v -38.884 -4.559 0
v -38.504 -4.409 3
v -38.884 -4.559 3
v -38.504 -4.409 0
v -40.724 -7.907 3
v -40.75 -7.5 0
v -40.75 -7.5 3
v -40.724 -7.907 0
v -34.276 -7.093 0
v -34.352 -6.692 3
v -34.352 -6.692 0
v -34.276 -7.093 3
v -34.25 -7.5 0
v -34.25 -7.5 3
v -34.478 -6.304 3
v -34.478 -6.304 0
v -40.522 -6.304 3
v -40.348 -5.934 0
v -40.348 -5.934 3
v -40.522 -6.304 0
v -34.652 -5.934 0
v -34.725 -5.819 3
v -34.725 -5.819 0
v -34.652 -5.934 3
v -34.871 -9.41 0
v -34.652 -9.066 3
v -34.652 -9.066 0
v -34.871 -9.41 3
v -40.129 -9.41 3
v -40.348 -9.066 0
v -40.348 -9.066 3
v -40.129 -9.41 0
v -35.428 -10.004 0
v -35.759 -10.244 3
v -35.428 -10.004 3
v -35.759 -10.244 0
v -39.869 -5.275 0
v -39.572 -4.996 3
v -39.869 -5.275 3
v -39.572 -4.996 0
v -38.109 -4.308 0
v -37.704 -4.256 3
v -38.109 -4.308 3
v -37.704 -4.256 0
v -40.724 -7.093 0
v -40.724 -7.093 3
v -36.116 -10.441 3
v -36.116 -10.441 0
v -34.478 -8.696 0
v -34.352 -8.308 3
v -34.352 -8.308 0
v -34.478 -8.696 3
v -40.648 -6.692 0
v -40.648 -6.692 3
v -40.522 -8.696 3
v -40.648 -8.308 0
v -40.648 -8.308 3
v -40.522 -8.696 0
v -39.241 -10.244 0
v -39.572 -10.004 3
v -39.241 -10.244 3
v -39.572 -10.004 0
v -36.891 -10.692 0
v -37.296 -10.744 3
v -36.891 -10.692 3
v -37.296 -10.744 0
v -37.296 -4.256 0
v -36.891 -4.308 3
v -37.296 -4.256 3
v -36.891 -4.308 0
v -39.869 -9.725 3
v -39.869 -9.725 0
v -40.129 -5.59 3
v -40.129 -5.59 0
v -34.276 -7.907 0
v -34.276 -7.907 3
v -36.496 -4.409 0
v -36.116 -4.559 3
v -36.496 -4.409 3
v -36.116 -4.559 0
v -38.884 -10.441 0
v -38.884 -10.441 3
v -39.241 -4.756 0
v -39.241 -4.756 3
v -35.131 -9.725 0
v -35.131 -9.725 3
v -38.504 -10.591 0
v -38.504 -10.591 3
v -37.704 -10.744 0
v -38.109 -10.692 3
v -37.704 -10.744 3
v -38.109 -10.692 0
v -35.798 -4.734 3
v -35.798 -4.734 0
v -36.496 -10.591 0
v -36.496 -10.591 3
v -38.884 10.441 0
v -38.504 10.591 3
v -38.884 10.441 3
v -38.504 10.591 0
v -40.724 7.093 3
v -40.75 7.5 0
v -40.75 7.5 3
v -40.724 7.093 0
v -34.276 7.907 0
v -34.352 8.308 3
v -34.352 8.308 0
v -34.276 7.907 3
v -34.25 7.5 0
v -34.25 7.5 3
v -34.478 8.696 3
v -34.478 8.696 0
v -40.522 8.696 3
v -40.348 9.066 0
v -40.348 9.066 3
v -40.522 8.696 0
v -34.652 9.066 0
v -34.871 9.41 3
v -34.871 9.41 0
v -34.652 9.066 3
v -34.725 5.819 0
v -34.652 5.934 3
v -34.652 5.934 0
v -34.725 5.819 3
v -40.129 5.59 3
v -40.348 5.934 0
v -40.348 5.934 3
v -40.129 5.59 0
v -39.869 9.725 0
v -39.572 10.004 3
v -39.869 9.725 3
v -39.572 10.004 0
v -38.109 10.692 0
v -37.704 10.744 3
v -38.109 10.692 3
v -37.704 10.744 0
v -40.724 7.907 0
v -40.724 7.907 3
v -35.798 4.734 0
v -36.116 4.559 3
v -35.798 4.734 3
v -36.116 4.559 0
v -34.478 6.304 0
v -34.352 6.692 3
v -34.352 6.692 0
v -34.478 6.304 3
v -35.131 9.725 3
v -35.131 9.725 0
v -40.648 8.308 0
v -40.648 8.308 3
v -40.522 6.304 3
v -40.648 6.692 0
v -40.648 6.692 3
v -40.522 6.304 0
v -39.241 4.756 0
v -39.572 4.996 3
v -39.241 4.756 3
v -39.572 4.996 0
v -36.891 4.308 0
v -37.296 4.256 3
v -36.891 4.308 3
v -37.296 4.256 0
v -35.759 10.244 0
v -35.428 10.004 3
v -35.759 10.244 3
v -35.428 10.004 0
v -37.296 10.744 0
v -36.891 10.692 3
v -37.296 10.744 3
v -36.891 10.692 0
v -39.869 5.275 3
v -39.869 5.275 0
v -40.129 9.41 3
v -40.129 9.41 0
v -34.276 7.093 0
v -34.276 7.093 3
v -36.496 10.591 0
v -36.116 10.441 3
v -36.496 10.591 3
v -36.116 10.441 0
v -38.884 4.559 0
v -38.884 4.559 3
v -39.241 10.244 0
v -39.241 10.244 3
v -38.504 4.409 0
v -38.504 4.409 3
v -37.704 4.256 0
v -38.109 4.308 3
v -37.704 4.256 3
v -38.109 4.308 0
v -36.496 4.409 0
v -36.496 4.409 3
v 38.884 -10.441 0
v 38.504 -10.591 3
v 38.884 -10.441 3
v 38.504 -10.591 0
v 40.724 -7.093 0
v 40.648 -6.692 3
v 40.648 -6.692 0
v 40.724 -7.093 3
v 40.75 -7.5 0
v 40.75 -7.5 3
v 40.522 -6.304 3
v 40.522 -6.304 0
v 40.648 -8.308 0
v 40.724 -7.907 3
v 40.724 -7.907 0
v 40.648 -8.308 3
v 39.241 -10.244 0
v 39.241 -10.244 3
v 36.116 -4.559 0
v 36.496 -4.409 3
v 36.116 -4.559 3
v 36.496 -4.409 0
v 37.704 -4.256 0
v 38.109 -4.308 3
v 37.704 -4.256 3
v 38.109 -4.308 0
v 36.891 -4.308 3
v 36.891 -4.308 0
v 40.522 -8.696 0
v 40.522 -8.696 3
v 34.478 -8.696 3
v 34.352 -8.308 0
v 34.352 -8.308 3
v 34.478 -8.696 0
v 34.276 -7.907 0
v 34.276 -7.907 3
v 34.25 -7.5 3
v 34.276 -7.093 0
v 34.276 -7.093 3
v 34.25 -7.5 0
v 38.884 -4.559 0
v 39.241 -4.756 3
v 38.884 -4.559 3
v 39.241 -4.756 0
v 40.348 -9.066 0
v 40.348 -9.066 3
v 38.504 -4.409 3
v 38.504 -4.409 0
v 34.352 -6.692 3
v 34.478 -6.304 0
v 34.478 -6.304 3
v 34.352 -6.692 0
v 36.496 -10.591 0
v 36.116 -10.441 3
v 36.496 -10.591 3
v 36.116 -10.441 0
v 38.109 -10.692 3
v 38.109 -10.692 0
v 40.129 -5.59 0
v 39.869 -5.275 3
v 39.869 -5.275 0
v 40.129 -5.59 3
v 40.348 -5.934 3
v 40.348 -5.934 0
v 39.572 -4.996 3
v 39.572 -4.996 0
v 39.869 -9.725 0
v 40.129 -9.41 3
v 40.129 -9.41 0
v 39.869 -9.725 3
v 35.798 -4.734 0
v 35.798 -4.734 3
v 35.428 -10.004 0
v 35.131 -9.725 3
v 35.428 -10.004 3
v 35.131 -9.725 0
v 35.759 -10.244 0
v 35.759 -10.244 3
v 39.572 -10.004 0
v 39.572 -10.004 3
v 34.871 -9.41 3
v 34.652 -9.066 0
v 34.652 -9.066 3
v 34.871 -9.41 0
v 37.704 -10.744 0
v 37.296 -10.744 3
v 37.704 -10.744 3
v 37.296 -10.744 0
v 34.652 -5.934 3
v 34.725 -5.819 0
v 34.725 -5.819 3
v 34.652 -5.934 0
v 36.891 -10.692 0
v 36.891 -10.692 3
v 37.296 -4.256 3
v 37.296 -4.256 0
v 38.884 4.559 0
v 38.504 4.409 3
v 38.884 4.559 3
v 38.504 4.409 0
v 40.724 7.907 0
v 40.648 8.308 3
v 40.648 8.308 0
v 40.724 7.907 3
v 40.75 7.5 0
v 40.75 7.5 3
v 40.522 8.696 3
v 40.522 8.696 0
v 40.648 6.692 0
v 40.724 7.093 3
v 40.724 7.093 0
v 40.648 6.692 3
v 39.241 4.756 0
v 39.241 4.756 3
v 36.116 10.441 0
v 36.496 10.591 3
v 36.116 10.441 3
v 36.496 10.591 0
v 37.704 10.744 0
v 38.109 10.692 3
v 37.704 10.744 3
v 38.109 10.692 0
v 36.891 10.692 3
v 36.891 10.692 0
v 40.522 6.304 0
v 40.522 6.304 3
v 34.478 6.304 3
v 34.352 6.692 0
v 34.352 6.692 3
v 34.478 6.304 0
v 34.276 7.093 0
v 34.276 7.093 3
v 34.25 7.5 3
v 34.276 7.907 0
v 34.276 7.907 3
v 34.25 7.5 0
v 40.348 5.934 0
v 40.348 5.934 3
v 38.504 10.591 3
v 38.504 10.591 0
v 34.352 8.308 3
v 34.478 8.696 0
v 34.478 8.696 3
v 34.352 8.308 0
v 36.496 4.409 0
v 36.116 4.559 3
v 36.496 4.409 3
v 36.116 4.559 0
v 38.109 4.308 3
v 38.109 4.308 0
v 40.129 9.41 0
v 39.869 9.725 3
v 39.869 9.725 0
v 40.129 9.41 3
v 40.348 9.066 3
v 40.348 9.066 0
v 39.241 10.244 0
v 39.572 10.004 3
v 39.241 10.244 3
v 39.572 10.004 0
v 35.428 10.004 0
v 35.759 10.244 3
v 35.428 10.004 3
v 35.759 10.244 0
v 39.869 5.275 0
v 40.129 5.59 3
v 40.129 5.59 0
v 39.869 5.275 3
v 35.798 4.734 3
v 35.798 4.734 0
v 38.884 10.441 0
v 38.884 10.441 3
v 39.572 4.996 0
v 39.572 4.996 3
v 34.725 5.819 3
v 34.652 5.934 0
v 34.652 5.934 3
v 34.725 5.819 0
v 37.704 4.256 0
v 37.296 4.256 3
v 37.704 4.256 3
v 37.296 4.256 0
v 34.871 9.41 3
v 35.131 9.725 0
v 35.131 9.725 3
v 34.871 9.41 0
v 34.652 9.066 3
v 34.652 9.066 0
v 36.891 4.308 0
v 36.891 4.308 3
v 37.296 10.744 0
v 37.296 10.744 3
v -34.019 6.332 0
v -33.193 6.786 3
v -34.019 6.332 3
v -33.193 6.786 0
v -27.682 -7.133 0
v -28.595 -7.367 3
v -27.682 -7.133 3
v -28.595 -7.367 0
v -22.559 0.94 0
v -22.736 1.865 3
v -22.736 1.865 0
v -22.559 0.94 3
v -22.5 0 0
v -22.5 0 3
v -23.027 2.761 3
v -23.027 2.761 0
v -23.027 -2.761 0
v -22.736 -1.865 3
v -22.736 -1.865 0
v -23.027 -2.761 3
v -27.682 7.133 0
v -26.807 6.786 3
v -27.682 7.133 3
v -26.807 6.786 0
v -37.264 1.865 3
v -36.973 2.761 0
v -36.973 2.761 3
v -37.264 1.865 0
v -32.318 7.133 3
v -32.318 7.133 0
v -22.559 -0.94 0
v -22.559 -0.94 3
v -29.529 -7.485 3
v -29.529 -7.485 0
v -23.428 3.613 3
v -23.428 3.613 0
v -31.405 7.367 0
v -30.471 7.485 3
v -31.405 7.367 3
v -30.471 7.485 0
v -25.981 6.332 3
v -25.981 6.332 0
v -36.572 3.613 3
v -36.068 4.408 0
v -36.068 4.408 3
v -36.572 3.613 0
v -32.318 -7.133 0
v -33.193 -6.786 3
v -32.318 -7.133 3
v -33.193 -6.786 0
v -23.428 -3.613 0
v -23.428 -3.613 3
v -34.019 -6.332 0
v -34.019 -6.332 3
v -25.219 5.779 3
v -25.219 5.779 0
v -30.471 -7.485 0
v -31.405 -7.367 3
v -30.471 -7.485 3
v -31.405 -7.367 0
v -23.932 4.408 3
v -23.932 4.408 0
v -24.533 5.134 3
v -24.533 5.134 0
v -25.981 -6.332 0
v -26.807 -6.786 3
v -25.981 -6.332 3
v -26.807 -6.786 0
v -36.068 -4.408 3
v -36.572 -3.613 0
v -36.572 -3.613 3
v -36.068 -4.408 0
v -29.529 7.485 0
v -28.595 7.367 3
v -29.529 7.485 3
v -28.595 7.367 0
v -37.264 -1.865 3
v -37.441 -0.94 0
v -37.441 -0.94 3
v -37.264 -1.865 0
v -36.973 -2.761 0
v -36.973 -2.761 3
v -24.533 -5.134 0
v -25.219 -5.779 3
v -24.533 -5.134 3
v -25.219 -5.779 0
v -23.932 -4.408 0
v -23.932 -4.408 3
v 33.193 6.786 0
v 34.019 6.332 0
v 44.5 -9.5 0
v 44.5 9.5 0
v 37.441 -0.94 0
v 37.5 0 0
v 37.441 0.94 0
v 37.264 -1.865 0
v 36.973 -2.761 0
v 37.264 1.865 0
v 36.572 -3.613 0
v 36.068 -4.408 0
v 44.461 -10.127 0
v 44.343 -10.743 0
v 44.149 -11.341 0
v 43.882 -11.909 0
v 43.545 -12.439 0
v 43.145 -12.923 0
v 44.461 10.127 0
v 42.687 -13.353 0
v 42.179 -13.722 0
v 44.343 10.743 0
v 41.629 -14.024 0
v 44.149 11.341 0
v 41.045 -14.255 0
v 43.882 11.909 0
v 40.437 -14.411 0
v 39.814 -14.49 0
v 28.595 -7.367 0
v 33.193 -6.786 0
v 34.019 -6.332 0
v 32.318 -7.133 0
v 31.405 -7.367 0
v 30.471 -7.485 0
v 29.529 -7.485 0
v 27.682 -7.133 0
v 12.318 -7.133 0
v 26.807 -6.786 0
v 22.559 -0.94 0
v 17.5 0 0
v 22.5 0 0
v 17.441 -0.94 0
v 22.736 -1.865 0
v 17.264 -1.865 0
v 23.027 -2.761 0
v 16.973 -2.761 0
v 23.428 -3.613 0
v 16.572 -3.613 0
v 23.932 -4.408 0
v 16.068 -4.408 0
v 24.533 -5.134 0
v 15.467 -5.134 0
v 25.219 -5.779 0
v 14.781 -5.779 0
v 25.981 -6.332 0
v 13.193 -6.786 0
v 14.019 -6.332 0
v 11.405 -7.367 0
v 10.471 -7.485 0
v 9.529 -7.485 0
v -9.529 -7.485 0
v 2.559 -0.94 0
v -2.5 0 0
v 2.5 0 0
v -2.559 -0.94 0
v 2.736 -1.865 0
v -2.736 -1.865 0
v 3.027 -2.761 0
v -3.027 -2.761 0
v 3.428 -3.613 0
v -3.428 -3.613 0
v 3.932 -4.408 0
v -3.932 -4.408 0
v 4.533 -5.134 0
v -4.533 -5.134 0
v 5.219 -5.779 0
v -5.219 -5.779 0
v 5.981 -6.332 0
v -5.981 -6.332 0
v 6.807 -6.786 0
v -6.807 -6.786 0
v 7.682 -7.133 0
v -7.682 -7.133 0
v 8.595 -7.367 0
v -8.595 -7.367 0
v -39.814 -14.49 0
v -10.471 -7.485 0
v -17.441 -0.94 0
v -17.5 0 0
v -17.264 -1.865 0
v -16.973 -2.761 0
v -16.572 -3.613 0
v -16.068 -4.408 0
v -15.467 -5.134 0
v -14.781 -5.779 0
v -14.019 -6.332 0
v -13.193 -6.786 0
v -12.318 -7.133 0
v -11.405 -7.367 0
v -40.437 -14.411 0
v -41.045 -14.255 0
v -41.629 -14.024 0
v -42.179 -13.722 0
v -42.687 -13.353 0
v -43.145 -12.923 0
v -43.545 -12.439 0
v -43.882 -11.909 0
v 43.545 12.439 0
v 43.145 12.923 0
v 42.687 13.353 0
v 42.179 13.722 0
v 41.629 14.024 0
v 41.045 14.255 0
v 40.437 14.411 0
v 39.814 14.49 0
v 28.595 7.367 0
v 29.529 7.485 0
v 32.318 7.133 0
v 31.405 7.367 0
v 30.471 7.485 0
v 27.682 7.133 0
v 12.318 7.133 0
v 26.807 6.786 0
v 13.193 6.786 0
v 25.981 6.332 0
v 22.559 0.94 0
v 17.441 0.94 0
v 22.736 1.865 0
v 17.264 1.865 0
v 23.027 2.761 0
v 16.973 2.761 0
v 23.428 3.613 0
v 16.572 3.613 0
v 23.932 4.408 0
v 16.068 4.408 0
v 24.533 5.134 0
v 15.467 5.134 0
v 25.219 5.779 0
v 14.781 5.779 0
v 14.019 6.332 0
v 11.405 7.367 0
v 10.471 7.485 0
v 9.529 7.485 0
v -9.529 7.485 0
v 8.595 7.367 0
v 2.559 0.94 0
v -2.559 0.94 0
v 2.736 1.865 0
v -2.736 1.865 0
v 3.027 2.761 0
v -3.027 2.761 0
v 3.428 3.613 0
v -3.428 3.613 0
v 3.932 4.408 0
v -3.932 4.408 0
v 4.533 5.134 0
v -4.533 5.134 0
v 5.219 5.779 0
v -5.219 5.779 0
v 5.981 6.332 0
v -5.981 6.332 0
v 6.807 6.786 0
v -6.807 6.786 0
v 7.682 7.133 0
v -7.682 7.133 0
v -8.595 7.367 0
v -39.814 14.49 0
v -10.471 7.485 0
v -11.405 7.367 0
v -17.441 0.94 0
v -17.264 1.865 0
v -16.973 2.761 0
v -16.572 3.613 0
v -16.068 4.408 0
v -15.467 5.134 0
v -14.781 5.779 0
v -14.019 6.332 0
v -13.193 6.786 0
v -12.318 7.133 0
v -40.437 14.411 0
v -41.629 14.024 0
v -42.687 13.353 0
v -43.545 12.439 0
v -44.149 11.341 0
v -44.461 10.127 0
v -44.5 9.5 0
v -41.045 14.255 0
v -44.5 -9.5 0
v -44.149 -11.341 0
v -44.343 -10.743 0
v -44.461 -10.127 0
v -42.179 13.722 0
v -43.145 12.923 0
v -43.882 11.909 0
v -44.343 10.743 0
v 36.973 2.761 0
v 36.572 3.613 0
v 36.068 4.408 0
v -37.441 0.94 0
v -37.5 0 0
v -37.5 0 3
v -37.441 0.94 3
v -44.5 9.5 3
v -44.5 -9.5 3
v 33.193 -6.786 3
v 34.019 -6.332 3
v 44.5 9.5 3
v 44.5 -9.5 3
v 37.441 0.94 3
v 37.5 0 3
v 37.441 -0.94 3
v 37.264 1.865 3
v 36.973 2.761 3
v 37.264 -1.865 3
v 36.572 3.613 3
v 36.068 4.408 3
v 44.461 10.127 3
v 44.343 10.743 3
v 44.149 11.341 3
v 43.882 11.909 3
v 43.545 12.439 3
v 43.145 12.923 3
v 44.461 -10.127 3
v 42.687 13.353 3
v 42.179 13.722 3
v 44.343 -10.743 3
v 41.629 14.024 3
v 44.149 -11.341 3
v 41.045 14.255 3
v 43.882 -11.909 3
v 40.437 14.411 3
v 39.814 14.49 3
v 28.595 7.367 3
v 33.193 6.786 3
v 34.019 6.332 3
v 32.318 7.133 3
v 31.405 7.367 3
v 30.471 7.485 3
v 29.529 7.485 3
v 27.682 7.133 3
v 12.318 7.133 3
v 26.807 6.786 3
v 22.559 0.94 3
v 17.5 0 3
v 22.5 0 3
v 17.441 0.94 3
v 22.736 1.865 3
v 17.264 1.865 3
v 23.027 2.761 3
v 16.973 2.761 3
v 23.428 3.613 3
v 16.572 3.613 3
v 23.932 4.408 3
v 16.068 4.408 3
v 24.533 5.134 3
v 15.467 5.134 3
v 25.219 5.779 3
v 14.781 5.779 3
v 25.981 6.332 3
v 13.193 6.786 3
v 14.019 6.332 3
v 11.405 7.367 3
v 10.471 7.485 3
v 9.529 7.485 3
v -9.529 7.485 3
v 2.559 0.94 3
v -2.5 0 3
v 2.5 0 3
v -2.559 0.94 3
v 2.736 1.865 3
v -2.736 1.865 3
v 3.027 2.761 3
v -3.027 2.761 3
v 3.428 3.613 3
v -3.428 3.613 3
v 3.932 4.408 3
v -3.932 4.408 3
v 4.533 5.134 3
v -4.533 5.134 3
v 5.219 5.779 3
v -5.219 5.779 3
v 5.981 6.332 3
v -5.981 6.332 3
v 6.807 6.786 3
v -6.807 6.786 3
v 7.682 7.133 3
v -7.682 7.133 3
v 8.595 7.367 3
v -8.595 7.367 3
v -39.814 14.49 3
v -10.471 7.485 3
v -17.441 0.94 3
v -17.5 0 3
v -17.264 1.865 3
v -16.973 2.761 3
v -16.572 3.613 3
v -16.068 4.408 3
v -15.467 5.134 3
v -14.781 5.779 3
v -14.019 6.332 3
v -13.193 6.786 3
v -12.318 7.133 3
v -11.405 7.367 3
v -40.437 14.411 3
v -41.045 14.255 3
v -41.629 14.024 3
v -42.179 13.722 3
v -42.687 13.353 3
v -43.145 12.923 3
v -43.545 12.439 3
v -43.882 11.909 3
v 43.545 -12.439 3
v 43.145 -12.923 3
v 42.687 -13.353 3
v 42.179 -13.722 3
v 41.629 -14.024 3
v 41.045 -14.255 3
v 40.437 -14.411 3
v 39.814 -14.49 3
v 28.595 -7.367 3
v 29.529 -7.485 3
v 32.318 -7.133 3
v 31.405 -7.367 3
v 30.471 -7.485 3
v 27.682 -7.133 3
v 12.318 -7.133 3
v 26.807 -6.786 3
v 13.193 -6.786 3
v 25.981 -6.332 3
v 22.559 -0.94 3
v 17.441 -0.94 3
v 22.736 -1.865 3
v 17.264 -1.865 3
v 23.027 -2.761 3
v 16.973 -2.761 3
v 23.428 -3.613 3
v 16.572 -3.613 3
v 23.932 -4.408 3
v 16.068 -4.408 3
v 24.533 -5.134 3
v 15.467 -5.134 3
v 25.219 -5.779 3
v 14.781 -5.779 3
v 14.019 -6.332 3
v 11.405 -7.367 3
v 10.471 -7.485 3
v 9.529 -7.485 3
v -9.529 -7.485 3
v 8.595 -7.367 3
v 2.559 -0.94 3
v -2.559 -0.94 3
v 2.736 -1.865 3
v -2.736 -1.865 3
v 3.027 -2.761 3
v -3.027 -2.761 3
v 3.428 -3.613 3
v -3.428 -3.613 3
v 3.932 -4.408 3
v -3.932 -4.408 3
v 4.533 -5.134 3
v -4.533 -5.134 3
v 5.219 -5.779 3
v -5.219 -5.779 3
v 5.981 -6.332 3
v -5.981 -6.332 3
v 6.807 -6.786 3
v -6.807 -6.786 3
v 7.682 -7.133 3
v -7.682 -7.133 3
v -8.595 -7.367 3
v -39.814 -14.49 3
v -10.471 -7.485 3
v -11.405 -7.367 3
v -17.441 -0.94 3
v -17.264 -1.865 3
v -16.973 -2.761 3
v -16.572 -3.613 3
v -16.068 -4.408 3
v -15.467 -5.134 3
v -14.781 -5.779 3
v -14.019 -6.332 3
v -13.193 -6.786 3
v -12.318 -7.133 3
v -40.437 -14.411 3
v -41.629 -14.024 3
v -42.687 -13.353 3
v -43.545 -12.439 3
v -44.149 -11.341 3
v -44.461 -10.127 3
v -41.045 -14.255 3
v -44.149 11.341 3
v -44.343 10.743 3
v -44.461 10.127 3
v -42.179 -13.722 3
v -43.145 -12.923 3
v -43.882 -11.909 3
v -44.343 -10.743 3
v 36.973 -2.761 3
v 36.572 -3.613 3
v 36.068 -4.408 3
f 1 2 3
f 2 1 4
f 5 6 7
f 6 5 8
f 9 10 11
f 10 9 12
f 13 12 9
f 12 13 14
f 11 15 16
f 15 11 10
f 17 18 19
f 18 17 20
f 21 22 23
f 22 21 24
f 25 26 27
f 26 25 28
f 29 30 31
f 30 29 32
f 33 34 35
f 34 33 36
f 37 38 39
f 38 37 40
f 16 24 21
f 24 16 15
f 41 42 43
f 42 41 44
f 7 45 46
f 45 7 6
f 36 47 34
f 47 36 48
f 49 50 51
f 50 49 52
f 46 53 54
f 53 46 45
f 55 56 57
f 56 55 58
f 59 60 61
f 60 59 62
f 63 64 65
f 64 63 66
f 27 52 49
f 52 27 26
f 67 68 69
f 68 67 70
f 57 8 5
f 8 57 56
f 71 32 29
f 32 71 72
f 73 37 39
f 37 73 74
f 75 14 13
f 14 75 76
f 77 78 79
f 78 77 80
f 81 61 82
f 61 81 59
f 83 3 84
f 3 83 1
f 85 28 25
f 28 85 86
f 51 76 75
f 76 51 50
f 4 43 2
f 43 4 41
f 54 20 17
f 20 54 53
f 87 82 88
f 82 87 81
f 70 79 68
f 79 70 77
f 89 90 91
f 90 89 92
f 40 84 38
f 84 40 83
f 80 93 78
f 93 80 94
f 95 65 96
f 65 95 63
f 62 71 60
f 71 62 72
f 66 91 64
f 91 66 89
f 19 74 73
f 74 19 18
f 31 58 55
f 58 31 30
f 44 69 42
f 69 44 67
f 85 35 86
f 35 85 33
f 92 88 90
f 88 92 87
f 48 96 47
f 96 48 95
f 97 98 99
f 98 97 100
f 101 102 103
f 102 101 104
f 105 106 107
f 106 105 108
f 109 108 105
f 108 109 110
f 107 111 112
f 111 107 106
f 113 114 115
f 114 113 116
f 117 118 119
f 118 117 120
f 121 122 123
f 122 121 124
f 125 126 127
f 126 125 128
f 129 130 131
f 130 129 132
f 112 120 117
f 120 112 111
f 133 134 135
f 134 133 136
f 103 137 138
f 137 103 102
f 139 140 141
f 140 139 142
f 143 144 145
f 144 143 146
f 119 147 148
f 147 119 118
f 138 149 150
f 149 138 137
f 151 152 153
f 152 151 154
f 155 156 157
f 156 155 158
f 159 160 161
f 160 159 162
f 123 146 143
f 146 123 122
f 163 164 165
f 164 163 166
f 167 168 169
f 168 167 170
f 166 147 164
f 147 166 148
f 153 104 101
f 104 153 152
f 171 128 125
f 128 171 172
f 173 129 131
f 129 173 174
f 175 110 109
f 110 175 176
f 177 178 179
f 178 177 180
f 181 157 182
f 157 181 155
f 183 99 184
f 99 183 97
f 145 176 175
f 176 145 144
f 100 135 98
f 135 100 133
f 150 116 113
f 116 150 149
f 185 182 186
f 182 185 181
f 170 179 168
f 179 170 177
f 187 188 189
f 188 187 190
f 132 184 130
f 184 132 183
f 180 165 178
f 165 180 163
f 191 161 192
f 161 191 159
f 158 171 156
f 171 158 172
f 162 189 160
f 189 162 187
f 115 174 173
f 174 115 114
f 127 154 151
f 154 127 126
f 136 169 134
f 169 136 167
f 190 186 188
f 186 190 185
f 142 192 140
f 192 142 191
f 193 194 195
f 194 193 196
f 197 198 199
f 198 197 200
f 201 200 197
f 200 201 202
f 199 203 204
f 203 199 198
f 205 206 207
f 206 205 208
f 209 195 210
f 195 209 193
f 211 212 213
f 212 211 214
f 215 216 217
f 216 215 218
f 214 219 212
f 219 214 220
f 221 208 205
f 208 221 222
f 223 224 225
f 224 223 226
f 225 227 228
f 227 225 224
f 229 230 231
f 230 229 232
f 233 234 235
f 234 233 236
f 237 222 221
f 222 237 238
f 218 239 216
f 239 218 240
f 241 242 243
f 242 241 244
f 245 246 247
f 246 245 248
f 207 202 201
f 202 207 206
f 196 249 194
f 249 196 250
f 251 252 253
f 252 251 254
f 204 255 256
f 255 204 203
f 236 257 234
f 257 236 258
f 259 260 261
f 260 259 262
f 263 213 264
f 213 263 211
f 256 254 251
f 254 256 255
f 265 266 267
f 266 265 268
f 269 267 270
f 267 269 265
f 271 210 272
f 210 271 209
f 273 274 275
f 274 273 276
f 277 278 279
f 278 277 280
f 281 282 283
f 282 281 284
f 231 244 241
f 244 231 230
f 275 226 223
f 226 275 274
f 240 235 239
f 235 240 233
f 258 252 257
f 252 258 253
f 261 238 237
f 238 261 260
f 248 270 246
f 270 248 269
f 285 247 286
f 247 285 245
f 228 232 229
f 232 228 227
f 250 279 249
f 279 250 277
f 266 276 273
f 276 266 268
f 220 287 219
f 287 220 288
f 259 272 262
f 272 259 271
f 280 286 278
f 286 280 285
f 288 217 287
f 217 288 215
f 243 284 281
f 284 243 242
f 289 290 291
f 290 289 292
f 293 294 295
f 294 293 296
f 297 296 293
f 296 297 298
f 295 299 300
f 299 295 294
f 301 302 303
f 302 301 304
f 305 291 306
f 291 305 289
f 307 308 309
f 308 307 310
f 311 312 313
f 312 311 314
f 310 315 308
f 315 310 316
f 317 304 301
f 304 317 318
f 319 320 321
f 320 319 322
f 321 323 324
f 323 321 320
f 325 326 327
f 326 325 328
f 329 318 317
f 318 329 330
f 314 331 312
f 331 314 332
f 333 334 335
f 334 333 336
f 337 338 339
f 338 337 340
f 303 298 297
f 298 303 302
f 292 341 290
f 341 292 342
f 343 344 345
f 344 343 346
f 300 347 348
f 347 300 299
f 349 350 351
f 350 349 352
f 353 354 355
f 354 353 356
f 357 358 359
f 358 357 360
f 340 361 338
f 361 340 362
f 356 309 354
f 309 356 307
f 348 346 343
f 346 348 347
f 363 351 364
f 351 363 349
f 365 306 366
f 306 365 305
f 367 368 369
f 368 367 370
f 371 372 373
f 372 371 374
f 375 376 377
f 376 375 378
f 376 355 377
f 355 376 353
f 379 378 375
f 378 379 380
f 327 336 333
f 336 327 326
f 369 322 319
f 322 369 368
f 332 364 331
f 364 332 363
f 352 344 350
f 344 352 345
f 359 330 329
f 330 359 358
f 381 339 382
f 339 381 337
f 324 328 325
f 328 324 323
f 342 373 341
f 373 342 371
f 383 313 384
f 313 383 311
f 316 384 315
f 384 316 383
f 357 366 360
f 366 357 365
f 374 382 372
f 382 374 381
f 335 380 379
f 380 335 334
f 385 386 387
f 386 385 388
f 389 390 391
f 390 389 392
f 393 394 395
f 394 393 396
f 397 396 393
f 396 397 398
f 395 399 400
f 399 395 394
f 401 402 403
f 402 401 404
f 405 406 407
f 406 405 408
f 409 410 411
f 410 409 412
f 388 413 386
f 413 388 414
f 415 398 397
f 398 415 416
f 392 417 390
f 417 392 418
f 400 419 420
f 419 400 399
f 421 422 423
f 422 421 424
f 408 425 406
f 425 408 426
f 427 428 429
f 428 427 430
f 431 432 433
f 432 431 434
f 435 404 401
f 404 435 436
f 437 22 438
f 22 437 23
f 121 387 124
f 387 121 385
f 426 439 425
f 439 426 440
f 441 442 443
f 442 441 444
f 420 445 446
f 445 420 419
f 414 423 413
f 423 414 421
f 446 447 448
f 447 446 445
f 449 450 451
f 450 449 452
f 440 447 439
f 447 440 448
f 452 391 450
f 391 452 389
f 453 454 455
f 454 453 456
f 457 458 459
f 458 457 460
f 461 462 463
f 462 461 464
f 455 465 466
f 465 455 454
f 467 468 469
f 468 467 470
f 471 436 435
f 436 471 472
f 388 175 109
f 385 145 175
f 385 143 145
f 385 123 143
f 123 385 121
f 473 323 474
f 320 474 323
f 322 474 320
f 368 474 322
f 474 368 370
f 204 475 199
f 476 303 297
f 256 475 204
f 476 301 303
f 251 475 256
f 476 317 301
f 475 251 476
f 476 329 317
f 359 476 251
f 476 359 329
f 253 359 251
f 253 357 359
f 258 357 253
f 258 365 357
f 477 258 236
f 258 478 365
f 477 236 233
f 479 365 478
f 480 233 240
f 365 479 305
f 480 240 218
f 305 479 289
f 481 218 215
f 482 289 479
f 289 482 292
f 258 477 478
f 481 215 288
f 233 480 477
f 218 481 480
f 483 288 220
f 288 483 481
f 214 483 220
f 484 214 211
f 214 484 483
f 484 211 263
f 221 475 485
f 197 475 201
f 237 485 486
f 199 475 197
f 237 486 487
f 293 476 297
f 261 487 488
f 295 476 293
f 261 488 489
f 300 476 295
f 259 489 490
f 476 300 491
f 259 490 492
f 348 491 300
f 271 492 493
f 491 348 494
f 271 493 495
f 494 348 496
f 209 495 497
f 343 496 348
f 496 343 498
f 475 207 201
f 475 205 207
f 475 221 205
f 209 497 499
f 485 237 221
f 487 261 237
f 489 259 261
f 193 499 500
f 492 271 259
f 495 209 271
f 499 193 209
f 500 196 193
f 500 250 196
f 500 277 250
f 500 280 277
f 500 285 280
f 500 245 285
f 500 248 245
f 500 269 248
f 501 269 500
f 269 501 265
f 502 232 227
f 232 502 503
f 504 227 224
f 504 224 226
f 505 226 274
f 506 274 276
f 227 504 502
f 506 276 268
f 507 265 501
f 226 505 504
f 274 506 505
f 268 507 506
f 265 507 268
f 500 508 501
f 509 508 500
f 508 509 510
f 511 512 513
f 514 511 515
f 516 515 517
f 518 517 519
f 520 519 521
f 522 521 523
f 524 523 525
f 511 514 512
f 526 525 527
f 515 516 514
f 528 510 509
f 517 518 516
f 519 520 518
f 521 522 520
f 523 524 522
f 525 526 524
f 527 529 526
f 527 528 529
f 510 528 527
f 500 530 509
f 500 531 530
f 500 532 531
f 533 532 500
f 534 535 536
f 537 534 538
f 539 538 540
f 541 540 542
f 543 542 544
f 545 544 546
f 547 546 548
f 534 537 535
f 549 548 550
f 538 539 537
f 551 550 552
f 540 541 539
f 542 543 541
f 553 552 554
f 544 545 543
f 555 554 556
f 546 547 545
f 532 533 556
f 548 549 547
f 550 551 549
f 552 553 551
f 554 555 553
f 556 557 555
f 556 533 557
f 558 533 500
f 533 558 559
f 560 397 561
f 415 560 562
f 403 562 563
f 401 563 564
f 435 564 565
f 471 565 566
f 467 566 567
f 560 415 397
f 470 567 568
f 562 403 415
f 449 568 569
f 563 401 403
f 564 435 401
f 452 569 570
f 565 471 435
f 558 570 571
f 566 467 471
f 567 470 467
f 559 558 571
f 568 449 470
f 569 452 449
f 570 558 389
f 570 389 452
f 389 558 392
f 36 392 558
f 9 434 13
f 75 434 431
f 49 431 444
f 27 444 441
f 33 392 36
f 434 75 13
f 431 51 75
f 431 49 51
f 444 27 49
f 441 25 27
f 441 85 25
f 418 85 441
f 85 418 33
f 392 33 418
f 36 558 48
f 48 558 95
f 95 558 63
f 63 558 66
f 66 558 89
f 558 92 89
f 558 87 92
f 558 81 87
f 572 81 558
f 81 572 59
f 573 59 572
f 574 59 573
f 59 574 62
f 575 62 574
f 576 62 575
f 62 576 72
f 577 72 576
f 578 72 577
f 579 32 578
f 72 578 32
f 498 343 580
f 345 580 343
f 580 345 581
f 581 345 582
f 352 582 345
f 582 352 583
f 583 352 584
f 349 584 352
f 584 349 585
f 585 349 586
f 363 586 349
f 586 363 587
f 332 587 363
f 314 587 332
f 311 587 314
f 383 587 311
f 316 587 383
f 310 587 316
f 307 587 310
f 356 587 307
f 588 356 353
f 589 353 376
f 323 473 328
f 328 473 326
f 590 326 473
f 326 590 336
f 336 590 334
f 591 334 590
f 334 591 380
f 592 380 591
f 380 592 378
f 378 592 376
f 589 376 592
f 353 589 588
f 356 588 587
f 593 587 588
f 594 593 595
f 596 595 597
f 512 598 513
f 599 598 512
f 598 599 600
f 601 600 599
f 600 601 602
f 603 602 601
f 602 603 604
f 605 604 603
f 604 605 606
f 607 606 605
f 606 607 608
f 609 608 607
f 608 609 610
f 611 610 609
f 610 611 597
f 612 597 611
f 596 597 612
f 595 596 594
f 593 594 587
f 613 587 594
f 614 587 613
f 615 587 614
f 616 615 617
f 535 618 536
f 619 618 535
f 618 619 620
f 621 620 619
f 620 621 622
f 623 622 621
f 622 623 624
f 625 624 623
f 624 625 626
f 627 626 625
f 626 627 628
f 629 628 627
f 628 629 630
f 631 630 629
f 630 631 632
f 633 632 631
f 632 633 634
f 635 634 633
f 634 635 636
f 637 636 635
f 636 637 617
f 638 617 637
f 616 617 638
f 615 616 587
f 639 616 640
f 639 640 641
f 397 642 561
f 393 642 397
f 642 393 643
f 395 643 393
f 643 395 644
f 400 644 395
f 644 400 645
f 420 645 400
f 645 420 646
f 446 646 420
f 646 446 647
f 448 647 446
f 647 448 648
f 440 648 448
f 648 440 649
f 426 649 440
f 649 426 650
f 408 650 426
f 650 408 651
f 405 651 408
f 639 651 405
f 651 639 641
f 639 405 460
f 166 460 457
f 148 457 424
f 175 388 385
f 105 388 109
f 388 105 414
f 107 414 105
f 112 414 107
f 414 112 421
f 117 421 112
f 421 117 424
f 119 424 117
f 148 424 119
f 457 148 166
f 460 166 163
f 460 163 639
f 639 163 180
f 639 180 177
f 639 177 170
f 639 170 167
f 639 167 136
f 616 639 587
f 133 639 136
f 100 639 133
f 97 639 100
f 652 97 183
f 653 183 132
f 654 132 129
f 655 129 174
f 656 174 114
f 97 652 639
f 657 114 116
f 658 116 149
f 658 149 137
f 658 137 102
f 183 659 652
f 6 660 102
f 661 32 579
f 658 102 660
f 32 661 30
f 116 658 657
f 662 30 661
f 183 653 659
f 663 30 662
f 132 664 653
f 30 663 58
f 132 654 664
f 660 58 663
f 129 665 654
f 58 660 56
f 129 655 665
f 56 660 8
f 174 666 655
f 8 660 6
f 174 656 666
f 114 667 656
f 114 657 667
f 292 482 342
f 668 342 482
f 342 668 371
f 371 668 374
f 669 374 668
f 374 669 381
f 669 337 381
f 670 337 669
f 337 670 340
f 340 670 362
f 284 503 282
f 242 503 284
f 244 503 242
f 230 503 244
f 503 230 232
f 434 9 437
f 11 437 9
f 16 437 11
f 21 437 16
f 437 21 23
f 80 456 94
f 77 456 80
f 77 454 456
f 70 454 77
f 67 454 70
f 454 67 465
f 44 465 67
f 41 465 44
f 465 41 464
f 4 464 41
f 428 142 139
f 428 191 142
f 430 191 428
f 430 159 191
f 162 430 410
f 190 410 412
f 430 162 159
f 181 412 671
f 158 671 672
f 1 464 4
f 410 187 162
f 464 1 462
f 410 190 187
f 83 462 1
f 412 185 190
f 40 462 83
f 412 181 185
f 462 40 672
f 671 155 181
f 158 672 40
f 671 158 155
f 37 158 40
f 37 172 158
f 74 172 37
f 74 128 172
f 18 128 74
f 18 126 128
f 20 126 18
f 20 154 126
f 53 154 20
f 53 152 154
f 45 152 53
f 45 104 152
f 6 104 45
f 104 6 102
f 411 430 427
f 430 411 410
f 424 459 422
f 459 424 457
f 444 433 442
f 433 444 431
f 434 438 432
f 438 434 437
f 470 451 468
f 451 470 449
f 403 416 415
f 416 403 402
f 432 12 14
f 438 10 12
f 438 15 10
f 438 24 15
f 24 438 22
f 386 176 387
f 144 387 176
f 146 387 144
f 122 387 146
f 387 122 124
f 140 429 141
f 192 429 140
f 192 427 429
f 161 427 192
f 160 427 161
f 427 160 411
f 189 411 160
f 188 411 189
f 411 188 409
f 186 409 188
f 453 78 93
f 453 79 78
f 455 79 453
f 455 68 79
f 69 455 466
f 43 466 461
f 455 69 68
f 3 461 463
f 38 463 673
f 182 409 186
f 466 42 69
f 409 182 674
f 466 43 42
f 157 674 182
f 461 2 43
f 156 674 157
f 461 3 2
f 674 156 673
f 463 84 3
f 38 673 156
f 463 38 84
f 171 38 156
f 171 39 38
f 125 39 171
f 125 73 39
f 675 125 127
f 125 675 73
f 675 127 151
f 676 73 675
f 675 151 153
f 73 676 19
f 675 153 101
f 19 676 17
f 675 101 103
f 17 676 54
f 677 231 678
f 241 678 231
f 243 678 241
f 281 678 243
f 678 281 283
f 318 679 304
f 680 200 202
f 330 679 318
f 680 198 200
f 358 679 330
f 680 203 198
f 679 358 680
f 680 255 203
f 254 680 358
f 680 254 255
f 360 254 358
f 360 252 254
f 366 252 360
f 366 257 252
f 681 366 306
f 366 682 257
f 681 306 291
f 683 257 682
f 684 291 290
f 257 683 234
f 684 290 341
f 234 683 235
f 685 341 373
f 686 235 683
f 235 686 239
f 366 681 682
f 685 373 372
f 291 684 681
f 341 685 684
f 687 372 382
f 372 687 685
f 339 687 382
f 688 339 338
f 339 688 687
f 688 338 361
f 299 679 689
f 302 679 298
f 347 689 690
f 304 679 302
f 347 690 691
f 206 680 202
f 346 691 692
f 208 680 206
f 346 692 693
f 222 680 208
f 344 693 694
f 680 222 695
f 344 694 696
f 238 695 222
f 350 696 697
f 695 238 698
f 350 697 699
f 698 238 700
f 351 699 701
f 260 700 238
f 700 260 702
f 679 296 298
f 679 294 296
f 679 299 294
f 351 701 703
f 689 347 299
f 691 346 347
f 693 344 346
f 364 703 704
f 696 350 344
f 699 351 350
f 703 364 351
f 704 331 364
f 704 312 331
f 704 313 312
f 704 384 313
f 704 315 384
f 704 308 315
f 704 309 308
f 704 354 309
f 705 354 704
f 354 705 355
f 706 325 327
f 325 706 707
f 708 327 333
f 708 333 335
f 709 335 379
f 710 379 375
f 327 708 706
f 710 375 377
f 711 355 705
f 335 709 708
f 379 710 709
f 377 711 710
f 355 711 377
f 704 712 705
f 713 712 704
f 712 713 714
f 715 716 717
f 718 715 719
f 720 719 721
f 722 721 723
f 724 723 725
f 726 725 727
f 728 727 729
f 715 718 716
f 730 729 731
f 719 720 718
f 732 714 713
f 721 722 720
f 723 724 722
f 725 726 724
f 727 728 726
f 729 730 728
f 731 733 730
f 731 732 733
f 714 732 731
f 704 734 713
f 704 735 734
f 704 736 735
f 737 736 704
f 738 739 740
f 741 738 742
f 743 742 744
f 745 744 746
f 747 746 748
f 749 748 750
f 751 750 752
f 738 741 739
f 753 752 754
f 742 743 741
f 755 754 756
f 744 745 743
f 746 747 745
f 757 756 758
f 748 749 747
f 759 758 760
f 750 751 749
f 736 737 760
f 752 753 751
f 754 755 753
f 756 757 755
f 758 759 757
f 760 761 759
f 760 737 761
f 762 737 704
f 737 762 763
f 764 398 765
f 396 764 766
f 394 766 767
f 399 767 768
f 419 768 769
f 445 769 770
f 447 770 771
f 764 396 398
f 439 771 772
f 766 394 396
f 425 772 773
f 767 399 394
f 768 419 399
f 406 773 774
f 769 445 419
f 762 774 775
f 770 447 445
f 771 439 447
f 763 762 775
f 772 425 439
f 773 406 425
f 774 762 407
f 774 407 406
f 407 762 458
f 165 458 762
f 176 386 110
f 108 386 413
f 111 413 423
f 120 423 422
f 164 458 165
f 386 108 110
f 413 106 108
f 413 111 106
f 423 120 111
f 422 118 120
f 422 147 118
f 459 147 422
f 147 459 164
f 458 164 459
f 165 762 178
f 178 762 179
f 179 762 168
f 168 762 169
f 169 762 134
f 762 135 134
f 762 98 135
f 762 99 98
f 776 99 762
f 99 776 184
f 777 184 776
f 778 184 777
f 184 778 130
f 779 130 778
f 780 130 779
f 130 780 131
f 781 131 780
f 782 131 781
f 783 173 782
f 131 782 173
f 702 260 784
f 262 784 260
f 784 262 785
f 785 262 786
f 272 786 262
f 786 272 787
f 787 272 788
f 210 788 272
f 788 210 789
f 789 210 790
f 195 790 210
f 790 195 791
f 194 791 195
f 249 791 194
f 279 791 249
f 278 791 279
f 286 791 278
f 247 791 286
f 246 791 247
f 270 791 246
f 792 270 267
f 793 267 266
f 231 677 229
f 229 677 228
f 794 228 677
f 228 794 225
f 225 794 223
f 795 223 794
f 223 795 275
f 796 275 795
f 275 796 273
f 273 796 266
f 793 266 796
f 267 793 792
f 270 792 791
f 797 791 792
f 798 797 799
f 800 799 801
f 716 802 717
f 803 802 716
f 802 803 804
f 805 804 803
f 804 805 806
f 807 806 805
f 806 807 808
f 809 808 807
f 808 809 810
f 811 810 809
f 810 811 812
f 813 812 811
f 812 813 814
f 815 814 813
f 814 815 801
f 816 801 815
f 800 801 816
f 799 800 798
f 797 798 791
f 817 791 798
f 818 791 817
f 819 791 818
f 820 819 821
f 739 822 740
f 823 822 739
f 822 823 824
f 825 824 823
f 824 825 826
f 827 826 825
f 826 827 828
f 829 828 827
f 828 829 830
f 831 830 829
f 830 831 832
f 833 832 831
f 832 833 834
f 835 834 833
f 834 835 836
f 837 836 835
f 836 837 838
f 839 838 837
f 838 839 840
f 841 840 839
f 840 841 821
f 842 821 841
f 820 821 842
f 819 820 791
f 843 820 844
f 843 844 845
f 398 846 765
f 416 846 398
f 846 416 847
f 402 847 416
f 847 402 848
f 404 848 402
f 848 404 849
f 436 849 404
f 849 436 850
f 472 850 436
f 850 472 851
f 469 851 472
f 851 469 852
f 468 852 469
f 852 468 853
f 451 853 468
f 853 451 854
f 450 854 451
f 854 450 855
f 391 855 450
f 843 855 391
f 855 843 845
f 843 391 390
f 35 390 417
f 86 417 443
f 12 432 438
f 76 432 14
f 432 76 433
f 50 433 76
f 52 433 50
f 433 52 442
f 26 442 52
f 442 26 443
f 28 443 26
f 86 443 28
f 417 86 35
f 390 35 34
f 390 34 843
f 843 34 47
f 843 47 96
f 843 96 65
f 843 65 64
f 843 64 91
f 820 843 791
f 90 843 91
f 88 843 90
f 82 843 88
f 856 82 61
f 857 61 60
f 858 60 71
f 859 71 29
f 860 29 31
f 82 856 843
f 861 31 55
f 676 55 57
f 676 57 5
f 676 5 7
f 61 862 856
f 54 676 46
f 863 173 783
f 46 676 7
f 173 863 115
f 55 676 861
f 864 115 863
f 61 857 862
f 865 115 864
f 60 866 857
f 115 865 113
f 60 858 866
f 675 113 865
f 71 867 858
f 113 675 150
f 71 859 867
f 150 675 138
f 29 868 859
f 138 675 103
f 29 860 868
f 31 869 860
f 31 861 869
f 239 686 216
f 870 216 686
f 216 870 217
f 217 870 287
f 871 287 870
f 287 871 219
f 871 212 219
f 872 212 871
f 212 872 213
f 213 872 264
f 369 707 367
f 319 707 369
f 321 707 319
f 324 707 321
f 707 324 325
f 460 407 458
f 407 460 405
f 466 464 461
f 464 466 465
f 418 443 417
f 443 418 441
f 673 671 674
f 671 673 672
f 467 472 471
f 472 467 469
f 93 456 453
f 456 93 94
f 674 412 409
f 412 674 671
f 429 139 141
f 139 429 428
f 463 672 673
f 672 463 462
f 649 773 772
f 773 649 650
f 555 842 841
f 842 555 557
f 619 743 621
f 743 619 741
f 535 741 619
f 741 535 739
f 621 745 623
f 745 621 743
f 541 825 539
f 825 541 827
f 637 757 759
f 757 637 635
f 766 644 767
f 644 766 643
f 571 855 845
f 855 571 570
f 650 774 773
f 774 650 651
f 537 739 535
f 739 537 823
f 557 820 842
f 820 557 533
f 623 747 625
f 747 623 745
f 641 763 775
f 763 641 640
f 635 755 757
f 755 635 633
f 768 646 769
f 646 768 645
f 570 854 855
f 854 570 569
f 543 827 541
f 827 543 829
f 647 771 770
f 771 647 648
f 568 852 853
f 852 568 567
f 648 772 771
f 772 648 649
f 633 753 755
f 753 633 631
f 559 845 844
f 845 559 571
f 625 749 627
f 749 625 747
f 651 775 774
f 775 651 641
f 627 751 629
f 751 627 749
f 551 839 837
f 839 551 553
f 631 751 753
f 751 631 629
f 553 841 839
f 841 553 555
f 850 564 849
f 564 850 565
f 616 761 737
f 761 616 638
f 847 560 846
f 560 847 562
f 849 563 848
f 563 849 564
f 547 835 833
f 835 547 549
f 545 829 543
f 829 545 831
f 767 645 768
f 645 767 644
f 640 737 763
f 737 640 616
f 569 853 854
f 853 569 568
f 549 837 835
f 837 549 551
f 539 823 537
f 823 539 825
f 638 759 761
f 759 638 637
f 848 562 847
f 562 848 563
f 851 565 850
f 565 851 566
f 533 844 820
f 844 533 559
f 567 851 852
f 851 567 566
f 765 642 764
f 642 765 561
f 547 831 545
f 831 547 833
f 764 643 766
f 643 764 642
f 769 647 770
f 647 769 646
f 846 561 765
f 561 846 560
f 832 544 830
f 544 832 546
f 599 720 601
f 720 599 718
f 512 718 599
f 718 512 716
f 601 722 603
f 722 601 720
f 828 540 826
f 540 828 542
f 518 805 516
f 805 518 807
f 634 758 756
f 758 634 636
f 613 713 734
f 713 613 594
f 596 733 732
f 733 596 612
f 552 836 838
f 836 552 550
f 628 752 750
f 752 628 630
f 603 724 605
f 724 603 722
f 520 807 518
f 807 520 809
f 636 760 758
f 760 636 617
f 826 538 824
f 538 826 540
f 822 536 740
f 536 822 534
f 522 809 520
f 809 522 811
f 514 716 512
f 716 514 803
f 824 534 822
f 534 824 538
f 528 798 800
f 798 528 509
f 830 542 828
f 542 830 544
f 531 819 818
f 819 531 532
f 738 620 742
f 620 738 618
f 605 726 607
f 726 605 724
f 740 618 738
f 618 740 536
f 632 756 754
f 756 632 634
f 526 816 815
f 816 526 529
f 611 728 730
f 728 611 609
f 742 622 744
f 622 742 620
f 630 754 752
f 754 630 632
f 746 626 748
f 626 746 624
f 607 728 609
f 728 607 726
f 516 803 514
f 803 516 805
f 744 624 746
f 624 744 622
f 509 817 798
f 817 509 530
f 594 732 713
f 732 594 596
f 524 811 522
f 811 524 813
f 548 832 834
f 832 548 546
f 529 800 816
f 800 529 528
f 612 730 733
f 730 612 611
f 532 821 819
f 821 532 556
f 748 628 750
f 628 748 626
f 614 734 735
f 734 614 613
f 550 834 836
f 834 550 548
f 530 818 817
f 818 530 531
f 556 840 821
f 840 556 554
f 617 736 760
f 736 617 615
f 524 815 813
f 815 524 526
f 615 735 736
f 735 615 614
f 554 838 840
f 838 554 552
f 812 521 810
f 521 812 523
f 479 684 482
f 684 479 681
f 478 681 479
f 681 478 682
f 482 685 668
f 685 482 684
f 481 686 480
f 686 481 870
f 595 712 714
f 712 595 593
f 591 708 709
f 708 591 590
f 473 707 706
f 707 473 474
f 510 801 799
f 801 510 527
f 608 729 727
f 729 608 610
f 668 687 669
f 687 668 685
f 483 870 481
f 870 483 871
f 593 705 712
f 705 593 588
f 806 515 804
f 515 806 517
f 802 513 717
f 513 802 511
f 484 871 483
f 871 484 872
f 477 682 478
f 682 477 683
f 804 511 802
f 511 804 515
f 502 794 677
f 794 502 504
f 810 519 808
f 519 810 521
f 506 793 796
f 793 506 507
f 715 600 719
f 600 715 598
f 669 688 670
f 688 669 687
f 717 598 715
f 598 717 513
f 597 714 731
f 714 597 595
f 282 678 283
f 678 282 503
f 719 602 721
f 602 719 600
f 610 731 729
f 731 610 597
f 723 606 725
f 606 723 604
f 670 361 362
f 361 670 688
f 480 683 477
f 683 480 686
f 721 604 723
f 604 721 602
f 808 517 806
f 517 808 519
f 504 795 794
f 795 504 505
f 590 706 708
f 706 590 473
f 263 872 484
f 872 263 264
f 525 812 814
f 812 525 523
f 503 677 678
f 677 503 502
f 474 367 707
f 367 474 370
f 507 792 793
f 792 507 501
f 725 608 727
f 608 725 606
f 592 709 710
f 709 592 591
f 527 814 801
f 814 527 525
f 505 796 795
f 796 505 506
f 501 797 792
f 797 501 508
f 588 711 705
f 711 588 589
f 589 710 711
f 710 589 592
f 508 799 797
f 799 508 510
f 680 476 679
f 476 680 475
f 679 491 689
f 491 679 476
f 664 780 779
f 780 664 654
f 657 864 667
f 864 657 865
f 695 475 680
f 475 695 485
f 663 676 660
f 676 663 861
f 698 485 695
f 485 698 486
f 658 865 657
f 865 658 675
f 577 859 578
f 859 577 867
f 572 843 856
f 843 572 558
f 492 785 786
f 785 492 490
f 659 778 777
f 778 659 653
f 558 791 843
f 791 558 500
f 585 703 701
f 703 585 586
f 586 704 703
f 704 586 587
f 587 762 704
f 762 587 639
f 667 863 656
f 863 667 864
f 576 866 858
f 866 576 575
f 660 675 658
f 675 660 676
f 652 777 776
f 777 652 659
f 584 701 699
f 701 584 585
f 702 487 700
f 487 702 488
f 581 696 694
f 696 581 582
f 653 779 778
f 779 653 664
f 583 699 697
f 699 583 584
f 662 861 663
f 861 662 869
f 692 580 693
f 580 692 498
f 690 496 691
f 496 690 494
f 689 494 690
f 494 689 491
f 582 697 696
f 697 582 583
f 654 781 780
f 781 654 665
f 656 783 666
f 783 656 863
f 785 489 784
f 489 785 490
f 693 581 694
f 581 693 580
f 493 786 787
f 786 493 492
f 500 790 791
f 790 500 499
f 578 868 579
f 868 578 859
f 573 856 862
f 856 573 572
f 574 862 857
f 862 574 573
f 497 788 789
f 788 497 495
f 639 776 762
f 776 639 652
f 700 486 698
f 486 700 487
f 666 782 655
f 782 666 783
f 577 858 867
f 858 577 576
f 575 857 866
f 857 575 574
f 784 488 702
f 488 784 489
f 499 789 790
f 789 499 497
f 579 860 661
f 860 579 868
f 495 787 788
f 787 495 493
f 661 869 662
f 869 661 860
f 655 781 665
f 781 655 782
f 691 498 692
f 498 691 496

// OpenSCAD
$fn = 50;


difference() {
	union() {
		hull() {
			translate(v = [-39.5000000000, 9.5000000000, 0]) {
				cylinder(h = 3, r = 5);
			}
			translate(v = [39.5000000000, 9.5000000000, 0]) {
				cylinder(h = 3, r = 5);
			}
			translate(v = [-39.5000000000, -9.5000000000, 0]) {
				cylinder(h = 3, r = 5);
			}
			translate(v = [39.5000000000, -9.5000000000, 0]) {
				cylinder(h = 3, r = 5);
			}
		}
	}
	union() {
		#translate(v = [-37.5000000000, -7.5000000000, -100.0000000000]) {
			cylinder(h = 200, r = 3.2500000000);
		}
		#translate(v = [-37.5000000000, 7.5000000000, -100.0000000000]) {
			cylinder(h = 200, r = 3.2500000000);
		}
		#translate(v = [37.5000000000, -7.5000000000, -100.0000000000]) {
			cylinder(h = 200, r = 3.2500000000);
		}
		#translate(v = [37.5000000000, 7.5000000000, -100.0000000000]) {
			cylinder(h = 200, r = 3.2500000000);
		}
		#translate(v = [-30.0000000000, 0, 0]) {
			cylinder(h = 3, r = 7.5000000000);
		}
		#translate(v = [-10.0000000000, 0, 0]) {
			cylinder(h = 3, r = 7.5000000000);
		}
		#translate(v = [10.0000000000, 0, 0]) {
			cylinder(h = 3, r = 7.5000000000);
		}
		#translate(v = [30.0000000000, 0, 0]) {
			cylinder(h = 3, r = 7.5000000000);
		}
	}
}
